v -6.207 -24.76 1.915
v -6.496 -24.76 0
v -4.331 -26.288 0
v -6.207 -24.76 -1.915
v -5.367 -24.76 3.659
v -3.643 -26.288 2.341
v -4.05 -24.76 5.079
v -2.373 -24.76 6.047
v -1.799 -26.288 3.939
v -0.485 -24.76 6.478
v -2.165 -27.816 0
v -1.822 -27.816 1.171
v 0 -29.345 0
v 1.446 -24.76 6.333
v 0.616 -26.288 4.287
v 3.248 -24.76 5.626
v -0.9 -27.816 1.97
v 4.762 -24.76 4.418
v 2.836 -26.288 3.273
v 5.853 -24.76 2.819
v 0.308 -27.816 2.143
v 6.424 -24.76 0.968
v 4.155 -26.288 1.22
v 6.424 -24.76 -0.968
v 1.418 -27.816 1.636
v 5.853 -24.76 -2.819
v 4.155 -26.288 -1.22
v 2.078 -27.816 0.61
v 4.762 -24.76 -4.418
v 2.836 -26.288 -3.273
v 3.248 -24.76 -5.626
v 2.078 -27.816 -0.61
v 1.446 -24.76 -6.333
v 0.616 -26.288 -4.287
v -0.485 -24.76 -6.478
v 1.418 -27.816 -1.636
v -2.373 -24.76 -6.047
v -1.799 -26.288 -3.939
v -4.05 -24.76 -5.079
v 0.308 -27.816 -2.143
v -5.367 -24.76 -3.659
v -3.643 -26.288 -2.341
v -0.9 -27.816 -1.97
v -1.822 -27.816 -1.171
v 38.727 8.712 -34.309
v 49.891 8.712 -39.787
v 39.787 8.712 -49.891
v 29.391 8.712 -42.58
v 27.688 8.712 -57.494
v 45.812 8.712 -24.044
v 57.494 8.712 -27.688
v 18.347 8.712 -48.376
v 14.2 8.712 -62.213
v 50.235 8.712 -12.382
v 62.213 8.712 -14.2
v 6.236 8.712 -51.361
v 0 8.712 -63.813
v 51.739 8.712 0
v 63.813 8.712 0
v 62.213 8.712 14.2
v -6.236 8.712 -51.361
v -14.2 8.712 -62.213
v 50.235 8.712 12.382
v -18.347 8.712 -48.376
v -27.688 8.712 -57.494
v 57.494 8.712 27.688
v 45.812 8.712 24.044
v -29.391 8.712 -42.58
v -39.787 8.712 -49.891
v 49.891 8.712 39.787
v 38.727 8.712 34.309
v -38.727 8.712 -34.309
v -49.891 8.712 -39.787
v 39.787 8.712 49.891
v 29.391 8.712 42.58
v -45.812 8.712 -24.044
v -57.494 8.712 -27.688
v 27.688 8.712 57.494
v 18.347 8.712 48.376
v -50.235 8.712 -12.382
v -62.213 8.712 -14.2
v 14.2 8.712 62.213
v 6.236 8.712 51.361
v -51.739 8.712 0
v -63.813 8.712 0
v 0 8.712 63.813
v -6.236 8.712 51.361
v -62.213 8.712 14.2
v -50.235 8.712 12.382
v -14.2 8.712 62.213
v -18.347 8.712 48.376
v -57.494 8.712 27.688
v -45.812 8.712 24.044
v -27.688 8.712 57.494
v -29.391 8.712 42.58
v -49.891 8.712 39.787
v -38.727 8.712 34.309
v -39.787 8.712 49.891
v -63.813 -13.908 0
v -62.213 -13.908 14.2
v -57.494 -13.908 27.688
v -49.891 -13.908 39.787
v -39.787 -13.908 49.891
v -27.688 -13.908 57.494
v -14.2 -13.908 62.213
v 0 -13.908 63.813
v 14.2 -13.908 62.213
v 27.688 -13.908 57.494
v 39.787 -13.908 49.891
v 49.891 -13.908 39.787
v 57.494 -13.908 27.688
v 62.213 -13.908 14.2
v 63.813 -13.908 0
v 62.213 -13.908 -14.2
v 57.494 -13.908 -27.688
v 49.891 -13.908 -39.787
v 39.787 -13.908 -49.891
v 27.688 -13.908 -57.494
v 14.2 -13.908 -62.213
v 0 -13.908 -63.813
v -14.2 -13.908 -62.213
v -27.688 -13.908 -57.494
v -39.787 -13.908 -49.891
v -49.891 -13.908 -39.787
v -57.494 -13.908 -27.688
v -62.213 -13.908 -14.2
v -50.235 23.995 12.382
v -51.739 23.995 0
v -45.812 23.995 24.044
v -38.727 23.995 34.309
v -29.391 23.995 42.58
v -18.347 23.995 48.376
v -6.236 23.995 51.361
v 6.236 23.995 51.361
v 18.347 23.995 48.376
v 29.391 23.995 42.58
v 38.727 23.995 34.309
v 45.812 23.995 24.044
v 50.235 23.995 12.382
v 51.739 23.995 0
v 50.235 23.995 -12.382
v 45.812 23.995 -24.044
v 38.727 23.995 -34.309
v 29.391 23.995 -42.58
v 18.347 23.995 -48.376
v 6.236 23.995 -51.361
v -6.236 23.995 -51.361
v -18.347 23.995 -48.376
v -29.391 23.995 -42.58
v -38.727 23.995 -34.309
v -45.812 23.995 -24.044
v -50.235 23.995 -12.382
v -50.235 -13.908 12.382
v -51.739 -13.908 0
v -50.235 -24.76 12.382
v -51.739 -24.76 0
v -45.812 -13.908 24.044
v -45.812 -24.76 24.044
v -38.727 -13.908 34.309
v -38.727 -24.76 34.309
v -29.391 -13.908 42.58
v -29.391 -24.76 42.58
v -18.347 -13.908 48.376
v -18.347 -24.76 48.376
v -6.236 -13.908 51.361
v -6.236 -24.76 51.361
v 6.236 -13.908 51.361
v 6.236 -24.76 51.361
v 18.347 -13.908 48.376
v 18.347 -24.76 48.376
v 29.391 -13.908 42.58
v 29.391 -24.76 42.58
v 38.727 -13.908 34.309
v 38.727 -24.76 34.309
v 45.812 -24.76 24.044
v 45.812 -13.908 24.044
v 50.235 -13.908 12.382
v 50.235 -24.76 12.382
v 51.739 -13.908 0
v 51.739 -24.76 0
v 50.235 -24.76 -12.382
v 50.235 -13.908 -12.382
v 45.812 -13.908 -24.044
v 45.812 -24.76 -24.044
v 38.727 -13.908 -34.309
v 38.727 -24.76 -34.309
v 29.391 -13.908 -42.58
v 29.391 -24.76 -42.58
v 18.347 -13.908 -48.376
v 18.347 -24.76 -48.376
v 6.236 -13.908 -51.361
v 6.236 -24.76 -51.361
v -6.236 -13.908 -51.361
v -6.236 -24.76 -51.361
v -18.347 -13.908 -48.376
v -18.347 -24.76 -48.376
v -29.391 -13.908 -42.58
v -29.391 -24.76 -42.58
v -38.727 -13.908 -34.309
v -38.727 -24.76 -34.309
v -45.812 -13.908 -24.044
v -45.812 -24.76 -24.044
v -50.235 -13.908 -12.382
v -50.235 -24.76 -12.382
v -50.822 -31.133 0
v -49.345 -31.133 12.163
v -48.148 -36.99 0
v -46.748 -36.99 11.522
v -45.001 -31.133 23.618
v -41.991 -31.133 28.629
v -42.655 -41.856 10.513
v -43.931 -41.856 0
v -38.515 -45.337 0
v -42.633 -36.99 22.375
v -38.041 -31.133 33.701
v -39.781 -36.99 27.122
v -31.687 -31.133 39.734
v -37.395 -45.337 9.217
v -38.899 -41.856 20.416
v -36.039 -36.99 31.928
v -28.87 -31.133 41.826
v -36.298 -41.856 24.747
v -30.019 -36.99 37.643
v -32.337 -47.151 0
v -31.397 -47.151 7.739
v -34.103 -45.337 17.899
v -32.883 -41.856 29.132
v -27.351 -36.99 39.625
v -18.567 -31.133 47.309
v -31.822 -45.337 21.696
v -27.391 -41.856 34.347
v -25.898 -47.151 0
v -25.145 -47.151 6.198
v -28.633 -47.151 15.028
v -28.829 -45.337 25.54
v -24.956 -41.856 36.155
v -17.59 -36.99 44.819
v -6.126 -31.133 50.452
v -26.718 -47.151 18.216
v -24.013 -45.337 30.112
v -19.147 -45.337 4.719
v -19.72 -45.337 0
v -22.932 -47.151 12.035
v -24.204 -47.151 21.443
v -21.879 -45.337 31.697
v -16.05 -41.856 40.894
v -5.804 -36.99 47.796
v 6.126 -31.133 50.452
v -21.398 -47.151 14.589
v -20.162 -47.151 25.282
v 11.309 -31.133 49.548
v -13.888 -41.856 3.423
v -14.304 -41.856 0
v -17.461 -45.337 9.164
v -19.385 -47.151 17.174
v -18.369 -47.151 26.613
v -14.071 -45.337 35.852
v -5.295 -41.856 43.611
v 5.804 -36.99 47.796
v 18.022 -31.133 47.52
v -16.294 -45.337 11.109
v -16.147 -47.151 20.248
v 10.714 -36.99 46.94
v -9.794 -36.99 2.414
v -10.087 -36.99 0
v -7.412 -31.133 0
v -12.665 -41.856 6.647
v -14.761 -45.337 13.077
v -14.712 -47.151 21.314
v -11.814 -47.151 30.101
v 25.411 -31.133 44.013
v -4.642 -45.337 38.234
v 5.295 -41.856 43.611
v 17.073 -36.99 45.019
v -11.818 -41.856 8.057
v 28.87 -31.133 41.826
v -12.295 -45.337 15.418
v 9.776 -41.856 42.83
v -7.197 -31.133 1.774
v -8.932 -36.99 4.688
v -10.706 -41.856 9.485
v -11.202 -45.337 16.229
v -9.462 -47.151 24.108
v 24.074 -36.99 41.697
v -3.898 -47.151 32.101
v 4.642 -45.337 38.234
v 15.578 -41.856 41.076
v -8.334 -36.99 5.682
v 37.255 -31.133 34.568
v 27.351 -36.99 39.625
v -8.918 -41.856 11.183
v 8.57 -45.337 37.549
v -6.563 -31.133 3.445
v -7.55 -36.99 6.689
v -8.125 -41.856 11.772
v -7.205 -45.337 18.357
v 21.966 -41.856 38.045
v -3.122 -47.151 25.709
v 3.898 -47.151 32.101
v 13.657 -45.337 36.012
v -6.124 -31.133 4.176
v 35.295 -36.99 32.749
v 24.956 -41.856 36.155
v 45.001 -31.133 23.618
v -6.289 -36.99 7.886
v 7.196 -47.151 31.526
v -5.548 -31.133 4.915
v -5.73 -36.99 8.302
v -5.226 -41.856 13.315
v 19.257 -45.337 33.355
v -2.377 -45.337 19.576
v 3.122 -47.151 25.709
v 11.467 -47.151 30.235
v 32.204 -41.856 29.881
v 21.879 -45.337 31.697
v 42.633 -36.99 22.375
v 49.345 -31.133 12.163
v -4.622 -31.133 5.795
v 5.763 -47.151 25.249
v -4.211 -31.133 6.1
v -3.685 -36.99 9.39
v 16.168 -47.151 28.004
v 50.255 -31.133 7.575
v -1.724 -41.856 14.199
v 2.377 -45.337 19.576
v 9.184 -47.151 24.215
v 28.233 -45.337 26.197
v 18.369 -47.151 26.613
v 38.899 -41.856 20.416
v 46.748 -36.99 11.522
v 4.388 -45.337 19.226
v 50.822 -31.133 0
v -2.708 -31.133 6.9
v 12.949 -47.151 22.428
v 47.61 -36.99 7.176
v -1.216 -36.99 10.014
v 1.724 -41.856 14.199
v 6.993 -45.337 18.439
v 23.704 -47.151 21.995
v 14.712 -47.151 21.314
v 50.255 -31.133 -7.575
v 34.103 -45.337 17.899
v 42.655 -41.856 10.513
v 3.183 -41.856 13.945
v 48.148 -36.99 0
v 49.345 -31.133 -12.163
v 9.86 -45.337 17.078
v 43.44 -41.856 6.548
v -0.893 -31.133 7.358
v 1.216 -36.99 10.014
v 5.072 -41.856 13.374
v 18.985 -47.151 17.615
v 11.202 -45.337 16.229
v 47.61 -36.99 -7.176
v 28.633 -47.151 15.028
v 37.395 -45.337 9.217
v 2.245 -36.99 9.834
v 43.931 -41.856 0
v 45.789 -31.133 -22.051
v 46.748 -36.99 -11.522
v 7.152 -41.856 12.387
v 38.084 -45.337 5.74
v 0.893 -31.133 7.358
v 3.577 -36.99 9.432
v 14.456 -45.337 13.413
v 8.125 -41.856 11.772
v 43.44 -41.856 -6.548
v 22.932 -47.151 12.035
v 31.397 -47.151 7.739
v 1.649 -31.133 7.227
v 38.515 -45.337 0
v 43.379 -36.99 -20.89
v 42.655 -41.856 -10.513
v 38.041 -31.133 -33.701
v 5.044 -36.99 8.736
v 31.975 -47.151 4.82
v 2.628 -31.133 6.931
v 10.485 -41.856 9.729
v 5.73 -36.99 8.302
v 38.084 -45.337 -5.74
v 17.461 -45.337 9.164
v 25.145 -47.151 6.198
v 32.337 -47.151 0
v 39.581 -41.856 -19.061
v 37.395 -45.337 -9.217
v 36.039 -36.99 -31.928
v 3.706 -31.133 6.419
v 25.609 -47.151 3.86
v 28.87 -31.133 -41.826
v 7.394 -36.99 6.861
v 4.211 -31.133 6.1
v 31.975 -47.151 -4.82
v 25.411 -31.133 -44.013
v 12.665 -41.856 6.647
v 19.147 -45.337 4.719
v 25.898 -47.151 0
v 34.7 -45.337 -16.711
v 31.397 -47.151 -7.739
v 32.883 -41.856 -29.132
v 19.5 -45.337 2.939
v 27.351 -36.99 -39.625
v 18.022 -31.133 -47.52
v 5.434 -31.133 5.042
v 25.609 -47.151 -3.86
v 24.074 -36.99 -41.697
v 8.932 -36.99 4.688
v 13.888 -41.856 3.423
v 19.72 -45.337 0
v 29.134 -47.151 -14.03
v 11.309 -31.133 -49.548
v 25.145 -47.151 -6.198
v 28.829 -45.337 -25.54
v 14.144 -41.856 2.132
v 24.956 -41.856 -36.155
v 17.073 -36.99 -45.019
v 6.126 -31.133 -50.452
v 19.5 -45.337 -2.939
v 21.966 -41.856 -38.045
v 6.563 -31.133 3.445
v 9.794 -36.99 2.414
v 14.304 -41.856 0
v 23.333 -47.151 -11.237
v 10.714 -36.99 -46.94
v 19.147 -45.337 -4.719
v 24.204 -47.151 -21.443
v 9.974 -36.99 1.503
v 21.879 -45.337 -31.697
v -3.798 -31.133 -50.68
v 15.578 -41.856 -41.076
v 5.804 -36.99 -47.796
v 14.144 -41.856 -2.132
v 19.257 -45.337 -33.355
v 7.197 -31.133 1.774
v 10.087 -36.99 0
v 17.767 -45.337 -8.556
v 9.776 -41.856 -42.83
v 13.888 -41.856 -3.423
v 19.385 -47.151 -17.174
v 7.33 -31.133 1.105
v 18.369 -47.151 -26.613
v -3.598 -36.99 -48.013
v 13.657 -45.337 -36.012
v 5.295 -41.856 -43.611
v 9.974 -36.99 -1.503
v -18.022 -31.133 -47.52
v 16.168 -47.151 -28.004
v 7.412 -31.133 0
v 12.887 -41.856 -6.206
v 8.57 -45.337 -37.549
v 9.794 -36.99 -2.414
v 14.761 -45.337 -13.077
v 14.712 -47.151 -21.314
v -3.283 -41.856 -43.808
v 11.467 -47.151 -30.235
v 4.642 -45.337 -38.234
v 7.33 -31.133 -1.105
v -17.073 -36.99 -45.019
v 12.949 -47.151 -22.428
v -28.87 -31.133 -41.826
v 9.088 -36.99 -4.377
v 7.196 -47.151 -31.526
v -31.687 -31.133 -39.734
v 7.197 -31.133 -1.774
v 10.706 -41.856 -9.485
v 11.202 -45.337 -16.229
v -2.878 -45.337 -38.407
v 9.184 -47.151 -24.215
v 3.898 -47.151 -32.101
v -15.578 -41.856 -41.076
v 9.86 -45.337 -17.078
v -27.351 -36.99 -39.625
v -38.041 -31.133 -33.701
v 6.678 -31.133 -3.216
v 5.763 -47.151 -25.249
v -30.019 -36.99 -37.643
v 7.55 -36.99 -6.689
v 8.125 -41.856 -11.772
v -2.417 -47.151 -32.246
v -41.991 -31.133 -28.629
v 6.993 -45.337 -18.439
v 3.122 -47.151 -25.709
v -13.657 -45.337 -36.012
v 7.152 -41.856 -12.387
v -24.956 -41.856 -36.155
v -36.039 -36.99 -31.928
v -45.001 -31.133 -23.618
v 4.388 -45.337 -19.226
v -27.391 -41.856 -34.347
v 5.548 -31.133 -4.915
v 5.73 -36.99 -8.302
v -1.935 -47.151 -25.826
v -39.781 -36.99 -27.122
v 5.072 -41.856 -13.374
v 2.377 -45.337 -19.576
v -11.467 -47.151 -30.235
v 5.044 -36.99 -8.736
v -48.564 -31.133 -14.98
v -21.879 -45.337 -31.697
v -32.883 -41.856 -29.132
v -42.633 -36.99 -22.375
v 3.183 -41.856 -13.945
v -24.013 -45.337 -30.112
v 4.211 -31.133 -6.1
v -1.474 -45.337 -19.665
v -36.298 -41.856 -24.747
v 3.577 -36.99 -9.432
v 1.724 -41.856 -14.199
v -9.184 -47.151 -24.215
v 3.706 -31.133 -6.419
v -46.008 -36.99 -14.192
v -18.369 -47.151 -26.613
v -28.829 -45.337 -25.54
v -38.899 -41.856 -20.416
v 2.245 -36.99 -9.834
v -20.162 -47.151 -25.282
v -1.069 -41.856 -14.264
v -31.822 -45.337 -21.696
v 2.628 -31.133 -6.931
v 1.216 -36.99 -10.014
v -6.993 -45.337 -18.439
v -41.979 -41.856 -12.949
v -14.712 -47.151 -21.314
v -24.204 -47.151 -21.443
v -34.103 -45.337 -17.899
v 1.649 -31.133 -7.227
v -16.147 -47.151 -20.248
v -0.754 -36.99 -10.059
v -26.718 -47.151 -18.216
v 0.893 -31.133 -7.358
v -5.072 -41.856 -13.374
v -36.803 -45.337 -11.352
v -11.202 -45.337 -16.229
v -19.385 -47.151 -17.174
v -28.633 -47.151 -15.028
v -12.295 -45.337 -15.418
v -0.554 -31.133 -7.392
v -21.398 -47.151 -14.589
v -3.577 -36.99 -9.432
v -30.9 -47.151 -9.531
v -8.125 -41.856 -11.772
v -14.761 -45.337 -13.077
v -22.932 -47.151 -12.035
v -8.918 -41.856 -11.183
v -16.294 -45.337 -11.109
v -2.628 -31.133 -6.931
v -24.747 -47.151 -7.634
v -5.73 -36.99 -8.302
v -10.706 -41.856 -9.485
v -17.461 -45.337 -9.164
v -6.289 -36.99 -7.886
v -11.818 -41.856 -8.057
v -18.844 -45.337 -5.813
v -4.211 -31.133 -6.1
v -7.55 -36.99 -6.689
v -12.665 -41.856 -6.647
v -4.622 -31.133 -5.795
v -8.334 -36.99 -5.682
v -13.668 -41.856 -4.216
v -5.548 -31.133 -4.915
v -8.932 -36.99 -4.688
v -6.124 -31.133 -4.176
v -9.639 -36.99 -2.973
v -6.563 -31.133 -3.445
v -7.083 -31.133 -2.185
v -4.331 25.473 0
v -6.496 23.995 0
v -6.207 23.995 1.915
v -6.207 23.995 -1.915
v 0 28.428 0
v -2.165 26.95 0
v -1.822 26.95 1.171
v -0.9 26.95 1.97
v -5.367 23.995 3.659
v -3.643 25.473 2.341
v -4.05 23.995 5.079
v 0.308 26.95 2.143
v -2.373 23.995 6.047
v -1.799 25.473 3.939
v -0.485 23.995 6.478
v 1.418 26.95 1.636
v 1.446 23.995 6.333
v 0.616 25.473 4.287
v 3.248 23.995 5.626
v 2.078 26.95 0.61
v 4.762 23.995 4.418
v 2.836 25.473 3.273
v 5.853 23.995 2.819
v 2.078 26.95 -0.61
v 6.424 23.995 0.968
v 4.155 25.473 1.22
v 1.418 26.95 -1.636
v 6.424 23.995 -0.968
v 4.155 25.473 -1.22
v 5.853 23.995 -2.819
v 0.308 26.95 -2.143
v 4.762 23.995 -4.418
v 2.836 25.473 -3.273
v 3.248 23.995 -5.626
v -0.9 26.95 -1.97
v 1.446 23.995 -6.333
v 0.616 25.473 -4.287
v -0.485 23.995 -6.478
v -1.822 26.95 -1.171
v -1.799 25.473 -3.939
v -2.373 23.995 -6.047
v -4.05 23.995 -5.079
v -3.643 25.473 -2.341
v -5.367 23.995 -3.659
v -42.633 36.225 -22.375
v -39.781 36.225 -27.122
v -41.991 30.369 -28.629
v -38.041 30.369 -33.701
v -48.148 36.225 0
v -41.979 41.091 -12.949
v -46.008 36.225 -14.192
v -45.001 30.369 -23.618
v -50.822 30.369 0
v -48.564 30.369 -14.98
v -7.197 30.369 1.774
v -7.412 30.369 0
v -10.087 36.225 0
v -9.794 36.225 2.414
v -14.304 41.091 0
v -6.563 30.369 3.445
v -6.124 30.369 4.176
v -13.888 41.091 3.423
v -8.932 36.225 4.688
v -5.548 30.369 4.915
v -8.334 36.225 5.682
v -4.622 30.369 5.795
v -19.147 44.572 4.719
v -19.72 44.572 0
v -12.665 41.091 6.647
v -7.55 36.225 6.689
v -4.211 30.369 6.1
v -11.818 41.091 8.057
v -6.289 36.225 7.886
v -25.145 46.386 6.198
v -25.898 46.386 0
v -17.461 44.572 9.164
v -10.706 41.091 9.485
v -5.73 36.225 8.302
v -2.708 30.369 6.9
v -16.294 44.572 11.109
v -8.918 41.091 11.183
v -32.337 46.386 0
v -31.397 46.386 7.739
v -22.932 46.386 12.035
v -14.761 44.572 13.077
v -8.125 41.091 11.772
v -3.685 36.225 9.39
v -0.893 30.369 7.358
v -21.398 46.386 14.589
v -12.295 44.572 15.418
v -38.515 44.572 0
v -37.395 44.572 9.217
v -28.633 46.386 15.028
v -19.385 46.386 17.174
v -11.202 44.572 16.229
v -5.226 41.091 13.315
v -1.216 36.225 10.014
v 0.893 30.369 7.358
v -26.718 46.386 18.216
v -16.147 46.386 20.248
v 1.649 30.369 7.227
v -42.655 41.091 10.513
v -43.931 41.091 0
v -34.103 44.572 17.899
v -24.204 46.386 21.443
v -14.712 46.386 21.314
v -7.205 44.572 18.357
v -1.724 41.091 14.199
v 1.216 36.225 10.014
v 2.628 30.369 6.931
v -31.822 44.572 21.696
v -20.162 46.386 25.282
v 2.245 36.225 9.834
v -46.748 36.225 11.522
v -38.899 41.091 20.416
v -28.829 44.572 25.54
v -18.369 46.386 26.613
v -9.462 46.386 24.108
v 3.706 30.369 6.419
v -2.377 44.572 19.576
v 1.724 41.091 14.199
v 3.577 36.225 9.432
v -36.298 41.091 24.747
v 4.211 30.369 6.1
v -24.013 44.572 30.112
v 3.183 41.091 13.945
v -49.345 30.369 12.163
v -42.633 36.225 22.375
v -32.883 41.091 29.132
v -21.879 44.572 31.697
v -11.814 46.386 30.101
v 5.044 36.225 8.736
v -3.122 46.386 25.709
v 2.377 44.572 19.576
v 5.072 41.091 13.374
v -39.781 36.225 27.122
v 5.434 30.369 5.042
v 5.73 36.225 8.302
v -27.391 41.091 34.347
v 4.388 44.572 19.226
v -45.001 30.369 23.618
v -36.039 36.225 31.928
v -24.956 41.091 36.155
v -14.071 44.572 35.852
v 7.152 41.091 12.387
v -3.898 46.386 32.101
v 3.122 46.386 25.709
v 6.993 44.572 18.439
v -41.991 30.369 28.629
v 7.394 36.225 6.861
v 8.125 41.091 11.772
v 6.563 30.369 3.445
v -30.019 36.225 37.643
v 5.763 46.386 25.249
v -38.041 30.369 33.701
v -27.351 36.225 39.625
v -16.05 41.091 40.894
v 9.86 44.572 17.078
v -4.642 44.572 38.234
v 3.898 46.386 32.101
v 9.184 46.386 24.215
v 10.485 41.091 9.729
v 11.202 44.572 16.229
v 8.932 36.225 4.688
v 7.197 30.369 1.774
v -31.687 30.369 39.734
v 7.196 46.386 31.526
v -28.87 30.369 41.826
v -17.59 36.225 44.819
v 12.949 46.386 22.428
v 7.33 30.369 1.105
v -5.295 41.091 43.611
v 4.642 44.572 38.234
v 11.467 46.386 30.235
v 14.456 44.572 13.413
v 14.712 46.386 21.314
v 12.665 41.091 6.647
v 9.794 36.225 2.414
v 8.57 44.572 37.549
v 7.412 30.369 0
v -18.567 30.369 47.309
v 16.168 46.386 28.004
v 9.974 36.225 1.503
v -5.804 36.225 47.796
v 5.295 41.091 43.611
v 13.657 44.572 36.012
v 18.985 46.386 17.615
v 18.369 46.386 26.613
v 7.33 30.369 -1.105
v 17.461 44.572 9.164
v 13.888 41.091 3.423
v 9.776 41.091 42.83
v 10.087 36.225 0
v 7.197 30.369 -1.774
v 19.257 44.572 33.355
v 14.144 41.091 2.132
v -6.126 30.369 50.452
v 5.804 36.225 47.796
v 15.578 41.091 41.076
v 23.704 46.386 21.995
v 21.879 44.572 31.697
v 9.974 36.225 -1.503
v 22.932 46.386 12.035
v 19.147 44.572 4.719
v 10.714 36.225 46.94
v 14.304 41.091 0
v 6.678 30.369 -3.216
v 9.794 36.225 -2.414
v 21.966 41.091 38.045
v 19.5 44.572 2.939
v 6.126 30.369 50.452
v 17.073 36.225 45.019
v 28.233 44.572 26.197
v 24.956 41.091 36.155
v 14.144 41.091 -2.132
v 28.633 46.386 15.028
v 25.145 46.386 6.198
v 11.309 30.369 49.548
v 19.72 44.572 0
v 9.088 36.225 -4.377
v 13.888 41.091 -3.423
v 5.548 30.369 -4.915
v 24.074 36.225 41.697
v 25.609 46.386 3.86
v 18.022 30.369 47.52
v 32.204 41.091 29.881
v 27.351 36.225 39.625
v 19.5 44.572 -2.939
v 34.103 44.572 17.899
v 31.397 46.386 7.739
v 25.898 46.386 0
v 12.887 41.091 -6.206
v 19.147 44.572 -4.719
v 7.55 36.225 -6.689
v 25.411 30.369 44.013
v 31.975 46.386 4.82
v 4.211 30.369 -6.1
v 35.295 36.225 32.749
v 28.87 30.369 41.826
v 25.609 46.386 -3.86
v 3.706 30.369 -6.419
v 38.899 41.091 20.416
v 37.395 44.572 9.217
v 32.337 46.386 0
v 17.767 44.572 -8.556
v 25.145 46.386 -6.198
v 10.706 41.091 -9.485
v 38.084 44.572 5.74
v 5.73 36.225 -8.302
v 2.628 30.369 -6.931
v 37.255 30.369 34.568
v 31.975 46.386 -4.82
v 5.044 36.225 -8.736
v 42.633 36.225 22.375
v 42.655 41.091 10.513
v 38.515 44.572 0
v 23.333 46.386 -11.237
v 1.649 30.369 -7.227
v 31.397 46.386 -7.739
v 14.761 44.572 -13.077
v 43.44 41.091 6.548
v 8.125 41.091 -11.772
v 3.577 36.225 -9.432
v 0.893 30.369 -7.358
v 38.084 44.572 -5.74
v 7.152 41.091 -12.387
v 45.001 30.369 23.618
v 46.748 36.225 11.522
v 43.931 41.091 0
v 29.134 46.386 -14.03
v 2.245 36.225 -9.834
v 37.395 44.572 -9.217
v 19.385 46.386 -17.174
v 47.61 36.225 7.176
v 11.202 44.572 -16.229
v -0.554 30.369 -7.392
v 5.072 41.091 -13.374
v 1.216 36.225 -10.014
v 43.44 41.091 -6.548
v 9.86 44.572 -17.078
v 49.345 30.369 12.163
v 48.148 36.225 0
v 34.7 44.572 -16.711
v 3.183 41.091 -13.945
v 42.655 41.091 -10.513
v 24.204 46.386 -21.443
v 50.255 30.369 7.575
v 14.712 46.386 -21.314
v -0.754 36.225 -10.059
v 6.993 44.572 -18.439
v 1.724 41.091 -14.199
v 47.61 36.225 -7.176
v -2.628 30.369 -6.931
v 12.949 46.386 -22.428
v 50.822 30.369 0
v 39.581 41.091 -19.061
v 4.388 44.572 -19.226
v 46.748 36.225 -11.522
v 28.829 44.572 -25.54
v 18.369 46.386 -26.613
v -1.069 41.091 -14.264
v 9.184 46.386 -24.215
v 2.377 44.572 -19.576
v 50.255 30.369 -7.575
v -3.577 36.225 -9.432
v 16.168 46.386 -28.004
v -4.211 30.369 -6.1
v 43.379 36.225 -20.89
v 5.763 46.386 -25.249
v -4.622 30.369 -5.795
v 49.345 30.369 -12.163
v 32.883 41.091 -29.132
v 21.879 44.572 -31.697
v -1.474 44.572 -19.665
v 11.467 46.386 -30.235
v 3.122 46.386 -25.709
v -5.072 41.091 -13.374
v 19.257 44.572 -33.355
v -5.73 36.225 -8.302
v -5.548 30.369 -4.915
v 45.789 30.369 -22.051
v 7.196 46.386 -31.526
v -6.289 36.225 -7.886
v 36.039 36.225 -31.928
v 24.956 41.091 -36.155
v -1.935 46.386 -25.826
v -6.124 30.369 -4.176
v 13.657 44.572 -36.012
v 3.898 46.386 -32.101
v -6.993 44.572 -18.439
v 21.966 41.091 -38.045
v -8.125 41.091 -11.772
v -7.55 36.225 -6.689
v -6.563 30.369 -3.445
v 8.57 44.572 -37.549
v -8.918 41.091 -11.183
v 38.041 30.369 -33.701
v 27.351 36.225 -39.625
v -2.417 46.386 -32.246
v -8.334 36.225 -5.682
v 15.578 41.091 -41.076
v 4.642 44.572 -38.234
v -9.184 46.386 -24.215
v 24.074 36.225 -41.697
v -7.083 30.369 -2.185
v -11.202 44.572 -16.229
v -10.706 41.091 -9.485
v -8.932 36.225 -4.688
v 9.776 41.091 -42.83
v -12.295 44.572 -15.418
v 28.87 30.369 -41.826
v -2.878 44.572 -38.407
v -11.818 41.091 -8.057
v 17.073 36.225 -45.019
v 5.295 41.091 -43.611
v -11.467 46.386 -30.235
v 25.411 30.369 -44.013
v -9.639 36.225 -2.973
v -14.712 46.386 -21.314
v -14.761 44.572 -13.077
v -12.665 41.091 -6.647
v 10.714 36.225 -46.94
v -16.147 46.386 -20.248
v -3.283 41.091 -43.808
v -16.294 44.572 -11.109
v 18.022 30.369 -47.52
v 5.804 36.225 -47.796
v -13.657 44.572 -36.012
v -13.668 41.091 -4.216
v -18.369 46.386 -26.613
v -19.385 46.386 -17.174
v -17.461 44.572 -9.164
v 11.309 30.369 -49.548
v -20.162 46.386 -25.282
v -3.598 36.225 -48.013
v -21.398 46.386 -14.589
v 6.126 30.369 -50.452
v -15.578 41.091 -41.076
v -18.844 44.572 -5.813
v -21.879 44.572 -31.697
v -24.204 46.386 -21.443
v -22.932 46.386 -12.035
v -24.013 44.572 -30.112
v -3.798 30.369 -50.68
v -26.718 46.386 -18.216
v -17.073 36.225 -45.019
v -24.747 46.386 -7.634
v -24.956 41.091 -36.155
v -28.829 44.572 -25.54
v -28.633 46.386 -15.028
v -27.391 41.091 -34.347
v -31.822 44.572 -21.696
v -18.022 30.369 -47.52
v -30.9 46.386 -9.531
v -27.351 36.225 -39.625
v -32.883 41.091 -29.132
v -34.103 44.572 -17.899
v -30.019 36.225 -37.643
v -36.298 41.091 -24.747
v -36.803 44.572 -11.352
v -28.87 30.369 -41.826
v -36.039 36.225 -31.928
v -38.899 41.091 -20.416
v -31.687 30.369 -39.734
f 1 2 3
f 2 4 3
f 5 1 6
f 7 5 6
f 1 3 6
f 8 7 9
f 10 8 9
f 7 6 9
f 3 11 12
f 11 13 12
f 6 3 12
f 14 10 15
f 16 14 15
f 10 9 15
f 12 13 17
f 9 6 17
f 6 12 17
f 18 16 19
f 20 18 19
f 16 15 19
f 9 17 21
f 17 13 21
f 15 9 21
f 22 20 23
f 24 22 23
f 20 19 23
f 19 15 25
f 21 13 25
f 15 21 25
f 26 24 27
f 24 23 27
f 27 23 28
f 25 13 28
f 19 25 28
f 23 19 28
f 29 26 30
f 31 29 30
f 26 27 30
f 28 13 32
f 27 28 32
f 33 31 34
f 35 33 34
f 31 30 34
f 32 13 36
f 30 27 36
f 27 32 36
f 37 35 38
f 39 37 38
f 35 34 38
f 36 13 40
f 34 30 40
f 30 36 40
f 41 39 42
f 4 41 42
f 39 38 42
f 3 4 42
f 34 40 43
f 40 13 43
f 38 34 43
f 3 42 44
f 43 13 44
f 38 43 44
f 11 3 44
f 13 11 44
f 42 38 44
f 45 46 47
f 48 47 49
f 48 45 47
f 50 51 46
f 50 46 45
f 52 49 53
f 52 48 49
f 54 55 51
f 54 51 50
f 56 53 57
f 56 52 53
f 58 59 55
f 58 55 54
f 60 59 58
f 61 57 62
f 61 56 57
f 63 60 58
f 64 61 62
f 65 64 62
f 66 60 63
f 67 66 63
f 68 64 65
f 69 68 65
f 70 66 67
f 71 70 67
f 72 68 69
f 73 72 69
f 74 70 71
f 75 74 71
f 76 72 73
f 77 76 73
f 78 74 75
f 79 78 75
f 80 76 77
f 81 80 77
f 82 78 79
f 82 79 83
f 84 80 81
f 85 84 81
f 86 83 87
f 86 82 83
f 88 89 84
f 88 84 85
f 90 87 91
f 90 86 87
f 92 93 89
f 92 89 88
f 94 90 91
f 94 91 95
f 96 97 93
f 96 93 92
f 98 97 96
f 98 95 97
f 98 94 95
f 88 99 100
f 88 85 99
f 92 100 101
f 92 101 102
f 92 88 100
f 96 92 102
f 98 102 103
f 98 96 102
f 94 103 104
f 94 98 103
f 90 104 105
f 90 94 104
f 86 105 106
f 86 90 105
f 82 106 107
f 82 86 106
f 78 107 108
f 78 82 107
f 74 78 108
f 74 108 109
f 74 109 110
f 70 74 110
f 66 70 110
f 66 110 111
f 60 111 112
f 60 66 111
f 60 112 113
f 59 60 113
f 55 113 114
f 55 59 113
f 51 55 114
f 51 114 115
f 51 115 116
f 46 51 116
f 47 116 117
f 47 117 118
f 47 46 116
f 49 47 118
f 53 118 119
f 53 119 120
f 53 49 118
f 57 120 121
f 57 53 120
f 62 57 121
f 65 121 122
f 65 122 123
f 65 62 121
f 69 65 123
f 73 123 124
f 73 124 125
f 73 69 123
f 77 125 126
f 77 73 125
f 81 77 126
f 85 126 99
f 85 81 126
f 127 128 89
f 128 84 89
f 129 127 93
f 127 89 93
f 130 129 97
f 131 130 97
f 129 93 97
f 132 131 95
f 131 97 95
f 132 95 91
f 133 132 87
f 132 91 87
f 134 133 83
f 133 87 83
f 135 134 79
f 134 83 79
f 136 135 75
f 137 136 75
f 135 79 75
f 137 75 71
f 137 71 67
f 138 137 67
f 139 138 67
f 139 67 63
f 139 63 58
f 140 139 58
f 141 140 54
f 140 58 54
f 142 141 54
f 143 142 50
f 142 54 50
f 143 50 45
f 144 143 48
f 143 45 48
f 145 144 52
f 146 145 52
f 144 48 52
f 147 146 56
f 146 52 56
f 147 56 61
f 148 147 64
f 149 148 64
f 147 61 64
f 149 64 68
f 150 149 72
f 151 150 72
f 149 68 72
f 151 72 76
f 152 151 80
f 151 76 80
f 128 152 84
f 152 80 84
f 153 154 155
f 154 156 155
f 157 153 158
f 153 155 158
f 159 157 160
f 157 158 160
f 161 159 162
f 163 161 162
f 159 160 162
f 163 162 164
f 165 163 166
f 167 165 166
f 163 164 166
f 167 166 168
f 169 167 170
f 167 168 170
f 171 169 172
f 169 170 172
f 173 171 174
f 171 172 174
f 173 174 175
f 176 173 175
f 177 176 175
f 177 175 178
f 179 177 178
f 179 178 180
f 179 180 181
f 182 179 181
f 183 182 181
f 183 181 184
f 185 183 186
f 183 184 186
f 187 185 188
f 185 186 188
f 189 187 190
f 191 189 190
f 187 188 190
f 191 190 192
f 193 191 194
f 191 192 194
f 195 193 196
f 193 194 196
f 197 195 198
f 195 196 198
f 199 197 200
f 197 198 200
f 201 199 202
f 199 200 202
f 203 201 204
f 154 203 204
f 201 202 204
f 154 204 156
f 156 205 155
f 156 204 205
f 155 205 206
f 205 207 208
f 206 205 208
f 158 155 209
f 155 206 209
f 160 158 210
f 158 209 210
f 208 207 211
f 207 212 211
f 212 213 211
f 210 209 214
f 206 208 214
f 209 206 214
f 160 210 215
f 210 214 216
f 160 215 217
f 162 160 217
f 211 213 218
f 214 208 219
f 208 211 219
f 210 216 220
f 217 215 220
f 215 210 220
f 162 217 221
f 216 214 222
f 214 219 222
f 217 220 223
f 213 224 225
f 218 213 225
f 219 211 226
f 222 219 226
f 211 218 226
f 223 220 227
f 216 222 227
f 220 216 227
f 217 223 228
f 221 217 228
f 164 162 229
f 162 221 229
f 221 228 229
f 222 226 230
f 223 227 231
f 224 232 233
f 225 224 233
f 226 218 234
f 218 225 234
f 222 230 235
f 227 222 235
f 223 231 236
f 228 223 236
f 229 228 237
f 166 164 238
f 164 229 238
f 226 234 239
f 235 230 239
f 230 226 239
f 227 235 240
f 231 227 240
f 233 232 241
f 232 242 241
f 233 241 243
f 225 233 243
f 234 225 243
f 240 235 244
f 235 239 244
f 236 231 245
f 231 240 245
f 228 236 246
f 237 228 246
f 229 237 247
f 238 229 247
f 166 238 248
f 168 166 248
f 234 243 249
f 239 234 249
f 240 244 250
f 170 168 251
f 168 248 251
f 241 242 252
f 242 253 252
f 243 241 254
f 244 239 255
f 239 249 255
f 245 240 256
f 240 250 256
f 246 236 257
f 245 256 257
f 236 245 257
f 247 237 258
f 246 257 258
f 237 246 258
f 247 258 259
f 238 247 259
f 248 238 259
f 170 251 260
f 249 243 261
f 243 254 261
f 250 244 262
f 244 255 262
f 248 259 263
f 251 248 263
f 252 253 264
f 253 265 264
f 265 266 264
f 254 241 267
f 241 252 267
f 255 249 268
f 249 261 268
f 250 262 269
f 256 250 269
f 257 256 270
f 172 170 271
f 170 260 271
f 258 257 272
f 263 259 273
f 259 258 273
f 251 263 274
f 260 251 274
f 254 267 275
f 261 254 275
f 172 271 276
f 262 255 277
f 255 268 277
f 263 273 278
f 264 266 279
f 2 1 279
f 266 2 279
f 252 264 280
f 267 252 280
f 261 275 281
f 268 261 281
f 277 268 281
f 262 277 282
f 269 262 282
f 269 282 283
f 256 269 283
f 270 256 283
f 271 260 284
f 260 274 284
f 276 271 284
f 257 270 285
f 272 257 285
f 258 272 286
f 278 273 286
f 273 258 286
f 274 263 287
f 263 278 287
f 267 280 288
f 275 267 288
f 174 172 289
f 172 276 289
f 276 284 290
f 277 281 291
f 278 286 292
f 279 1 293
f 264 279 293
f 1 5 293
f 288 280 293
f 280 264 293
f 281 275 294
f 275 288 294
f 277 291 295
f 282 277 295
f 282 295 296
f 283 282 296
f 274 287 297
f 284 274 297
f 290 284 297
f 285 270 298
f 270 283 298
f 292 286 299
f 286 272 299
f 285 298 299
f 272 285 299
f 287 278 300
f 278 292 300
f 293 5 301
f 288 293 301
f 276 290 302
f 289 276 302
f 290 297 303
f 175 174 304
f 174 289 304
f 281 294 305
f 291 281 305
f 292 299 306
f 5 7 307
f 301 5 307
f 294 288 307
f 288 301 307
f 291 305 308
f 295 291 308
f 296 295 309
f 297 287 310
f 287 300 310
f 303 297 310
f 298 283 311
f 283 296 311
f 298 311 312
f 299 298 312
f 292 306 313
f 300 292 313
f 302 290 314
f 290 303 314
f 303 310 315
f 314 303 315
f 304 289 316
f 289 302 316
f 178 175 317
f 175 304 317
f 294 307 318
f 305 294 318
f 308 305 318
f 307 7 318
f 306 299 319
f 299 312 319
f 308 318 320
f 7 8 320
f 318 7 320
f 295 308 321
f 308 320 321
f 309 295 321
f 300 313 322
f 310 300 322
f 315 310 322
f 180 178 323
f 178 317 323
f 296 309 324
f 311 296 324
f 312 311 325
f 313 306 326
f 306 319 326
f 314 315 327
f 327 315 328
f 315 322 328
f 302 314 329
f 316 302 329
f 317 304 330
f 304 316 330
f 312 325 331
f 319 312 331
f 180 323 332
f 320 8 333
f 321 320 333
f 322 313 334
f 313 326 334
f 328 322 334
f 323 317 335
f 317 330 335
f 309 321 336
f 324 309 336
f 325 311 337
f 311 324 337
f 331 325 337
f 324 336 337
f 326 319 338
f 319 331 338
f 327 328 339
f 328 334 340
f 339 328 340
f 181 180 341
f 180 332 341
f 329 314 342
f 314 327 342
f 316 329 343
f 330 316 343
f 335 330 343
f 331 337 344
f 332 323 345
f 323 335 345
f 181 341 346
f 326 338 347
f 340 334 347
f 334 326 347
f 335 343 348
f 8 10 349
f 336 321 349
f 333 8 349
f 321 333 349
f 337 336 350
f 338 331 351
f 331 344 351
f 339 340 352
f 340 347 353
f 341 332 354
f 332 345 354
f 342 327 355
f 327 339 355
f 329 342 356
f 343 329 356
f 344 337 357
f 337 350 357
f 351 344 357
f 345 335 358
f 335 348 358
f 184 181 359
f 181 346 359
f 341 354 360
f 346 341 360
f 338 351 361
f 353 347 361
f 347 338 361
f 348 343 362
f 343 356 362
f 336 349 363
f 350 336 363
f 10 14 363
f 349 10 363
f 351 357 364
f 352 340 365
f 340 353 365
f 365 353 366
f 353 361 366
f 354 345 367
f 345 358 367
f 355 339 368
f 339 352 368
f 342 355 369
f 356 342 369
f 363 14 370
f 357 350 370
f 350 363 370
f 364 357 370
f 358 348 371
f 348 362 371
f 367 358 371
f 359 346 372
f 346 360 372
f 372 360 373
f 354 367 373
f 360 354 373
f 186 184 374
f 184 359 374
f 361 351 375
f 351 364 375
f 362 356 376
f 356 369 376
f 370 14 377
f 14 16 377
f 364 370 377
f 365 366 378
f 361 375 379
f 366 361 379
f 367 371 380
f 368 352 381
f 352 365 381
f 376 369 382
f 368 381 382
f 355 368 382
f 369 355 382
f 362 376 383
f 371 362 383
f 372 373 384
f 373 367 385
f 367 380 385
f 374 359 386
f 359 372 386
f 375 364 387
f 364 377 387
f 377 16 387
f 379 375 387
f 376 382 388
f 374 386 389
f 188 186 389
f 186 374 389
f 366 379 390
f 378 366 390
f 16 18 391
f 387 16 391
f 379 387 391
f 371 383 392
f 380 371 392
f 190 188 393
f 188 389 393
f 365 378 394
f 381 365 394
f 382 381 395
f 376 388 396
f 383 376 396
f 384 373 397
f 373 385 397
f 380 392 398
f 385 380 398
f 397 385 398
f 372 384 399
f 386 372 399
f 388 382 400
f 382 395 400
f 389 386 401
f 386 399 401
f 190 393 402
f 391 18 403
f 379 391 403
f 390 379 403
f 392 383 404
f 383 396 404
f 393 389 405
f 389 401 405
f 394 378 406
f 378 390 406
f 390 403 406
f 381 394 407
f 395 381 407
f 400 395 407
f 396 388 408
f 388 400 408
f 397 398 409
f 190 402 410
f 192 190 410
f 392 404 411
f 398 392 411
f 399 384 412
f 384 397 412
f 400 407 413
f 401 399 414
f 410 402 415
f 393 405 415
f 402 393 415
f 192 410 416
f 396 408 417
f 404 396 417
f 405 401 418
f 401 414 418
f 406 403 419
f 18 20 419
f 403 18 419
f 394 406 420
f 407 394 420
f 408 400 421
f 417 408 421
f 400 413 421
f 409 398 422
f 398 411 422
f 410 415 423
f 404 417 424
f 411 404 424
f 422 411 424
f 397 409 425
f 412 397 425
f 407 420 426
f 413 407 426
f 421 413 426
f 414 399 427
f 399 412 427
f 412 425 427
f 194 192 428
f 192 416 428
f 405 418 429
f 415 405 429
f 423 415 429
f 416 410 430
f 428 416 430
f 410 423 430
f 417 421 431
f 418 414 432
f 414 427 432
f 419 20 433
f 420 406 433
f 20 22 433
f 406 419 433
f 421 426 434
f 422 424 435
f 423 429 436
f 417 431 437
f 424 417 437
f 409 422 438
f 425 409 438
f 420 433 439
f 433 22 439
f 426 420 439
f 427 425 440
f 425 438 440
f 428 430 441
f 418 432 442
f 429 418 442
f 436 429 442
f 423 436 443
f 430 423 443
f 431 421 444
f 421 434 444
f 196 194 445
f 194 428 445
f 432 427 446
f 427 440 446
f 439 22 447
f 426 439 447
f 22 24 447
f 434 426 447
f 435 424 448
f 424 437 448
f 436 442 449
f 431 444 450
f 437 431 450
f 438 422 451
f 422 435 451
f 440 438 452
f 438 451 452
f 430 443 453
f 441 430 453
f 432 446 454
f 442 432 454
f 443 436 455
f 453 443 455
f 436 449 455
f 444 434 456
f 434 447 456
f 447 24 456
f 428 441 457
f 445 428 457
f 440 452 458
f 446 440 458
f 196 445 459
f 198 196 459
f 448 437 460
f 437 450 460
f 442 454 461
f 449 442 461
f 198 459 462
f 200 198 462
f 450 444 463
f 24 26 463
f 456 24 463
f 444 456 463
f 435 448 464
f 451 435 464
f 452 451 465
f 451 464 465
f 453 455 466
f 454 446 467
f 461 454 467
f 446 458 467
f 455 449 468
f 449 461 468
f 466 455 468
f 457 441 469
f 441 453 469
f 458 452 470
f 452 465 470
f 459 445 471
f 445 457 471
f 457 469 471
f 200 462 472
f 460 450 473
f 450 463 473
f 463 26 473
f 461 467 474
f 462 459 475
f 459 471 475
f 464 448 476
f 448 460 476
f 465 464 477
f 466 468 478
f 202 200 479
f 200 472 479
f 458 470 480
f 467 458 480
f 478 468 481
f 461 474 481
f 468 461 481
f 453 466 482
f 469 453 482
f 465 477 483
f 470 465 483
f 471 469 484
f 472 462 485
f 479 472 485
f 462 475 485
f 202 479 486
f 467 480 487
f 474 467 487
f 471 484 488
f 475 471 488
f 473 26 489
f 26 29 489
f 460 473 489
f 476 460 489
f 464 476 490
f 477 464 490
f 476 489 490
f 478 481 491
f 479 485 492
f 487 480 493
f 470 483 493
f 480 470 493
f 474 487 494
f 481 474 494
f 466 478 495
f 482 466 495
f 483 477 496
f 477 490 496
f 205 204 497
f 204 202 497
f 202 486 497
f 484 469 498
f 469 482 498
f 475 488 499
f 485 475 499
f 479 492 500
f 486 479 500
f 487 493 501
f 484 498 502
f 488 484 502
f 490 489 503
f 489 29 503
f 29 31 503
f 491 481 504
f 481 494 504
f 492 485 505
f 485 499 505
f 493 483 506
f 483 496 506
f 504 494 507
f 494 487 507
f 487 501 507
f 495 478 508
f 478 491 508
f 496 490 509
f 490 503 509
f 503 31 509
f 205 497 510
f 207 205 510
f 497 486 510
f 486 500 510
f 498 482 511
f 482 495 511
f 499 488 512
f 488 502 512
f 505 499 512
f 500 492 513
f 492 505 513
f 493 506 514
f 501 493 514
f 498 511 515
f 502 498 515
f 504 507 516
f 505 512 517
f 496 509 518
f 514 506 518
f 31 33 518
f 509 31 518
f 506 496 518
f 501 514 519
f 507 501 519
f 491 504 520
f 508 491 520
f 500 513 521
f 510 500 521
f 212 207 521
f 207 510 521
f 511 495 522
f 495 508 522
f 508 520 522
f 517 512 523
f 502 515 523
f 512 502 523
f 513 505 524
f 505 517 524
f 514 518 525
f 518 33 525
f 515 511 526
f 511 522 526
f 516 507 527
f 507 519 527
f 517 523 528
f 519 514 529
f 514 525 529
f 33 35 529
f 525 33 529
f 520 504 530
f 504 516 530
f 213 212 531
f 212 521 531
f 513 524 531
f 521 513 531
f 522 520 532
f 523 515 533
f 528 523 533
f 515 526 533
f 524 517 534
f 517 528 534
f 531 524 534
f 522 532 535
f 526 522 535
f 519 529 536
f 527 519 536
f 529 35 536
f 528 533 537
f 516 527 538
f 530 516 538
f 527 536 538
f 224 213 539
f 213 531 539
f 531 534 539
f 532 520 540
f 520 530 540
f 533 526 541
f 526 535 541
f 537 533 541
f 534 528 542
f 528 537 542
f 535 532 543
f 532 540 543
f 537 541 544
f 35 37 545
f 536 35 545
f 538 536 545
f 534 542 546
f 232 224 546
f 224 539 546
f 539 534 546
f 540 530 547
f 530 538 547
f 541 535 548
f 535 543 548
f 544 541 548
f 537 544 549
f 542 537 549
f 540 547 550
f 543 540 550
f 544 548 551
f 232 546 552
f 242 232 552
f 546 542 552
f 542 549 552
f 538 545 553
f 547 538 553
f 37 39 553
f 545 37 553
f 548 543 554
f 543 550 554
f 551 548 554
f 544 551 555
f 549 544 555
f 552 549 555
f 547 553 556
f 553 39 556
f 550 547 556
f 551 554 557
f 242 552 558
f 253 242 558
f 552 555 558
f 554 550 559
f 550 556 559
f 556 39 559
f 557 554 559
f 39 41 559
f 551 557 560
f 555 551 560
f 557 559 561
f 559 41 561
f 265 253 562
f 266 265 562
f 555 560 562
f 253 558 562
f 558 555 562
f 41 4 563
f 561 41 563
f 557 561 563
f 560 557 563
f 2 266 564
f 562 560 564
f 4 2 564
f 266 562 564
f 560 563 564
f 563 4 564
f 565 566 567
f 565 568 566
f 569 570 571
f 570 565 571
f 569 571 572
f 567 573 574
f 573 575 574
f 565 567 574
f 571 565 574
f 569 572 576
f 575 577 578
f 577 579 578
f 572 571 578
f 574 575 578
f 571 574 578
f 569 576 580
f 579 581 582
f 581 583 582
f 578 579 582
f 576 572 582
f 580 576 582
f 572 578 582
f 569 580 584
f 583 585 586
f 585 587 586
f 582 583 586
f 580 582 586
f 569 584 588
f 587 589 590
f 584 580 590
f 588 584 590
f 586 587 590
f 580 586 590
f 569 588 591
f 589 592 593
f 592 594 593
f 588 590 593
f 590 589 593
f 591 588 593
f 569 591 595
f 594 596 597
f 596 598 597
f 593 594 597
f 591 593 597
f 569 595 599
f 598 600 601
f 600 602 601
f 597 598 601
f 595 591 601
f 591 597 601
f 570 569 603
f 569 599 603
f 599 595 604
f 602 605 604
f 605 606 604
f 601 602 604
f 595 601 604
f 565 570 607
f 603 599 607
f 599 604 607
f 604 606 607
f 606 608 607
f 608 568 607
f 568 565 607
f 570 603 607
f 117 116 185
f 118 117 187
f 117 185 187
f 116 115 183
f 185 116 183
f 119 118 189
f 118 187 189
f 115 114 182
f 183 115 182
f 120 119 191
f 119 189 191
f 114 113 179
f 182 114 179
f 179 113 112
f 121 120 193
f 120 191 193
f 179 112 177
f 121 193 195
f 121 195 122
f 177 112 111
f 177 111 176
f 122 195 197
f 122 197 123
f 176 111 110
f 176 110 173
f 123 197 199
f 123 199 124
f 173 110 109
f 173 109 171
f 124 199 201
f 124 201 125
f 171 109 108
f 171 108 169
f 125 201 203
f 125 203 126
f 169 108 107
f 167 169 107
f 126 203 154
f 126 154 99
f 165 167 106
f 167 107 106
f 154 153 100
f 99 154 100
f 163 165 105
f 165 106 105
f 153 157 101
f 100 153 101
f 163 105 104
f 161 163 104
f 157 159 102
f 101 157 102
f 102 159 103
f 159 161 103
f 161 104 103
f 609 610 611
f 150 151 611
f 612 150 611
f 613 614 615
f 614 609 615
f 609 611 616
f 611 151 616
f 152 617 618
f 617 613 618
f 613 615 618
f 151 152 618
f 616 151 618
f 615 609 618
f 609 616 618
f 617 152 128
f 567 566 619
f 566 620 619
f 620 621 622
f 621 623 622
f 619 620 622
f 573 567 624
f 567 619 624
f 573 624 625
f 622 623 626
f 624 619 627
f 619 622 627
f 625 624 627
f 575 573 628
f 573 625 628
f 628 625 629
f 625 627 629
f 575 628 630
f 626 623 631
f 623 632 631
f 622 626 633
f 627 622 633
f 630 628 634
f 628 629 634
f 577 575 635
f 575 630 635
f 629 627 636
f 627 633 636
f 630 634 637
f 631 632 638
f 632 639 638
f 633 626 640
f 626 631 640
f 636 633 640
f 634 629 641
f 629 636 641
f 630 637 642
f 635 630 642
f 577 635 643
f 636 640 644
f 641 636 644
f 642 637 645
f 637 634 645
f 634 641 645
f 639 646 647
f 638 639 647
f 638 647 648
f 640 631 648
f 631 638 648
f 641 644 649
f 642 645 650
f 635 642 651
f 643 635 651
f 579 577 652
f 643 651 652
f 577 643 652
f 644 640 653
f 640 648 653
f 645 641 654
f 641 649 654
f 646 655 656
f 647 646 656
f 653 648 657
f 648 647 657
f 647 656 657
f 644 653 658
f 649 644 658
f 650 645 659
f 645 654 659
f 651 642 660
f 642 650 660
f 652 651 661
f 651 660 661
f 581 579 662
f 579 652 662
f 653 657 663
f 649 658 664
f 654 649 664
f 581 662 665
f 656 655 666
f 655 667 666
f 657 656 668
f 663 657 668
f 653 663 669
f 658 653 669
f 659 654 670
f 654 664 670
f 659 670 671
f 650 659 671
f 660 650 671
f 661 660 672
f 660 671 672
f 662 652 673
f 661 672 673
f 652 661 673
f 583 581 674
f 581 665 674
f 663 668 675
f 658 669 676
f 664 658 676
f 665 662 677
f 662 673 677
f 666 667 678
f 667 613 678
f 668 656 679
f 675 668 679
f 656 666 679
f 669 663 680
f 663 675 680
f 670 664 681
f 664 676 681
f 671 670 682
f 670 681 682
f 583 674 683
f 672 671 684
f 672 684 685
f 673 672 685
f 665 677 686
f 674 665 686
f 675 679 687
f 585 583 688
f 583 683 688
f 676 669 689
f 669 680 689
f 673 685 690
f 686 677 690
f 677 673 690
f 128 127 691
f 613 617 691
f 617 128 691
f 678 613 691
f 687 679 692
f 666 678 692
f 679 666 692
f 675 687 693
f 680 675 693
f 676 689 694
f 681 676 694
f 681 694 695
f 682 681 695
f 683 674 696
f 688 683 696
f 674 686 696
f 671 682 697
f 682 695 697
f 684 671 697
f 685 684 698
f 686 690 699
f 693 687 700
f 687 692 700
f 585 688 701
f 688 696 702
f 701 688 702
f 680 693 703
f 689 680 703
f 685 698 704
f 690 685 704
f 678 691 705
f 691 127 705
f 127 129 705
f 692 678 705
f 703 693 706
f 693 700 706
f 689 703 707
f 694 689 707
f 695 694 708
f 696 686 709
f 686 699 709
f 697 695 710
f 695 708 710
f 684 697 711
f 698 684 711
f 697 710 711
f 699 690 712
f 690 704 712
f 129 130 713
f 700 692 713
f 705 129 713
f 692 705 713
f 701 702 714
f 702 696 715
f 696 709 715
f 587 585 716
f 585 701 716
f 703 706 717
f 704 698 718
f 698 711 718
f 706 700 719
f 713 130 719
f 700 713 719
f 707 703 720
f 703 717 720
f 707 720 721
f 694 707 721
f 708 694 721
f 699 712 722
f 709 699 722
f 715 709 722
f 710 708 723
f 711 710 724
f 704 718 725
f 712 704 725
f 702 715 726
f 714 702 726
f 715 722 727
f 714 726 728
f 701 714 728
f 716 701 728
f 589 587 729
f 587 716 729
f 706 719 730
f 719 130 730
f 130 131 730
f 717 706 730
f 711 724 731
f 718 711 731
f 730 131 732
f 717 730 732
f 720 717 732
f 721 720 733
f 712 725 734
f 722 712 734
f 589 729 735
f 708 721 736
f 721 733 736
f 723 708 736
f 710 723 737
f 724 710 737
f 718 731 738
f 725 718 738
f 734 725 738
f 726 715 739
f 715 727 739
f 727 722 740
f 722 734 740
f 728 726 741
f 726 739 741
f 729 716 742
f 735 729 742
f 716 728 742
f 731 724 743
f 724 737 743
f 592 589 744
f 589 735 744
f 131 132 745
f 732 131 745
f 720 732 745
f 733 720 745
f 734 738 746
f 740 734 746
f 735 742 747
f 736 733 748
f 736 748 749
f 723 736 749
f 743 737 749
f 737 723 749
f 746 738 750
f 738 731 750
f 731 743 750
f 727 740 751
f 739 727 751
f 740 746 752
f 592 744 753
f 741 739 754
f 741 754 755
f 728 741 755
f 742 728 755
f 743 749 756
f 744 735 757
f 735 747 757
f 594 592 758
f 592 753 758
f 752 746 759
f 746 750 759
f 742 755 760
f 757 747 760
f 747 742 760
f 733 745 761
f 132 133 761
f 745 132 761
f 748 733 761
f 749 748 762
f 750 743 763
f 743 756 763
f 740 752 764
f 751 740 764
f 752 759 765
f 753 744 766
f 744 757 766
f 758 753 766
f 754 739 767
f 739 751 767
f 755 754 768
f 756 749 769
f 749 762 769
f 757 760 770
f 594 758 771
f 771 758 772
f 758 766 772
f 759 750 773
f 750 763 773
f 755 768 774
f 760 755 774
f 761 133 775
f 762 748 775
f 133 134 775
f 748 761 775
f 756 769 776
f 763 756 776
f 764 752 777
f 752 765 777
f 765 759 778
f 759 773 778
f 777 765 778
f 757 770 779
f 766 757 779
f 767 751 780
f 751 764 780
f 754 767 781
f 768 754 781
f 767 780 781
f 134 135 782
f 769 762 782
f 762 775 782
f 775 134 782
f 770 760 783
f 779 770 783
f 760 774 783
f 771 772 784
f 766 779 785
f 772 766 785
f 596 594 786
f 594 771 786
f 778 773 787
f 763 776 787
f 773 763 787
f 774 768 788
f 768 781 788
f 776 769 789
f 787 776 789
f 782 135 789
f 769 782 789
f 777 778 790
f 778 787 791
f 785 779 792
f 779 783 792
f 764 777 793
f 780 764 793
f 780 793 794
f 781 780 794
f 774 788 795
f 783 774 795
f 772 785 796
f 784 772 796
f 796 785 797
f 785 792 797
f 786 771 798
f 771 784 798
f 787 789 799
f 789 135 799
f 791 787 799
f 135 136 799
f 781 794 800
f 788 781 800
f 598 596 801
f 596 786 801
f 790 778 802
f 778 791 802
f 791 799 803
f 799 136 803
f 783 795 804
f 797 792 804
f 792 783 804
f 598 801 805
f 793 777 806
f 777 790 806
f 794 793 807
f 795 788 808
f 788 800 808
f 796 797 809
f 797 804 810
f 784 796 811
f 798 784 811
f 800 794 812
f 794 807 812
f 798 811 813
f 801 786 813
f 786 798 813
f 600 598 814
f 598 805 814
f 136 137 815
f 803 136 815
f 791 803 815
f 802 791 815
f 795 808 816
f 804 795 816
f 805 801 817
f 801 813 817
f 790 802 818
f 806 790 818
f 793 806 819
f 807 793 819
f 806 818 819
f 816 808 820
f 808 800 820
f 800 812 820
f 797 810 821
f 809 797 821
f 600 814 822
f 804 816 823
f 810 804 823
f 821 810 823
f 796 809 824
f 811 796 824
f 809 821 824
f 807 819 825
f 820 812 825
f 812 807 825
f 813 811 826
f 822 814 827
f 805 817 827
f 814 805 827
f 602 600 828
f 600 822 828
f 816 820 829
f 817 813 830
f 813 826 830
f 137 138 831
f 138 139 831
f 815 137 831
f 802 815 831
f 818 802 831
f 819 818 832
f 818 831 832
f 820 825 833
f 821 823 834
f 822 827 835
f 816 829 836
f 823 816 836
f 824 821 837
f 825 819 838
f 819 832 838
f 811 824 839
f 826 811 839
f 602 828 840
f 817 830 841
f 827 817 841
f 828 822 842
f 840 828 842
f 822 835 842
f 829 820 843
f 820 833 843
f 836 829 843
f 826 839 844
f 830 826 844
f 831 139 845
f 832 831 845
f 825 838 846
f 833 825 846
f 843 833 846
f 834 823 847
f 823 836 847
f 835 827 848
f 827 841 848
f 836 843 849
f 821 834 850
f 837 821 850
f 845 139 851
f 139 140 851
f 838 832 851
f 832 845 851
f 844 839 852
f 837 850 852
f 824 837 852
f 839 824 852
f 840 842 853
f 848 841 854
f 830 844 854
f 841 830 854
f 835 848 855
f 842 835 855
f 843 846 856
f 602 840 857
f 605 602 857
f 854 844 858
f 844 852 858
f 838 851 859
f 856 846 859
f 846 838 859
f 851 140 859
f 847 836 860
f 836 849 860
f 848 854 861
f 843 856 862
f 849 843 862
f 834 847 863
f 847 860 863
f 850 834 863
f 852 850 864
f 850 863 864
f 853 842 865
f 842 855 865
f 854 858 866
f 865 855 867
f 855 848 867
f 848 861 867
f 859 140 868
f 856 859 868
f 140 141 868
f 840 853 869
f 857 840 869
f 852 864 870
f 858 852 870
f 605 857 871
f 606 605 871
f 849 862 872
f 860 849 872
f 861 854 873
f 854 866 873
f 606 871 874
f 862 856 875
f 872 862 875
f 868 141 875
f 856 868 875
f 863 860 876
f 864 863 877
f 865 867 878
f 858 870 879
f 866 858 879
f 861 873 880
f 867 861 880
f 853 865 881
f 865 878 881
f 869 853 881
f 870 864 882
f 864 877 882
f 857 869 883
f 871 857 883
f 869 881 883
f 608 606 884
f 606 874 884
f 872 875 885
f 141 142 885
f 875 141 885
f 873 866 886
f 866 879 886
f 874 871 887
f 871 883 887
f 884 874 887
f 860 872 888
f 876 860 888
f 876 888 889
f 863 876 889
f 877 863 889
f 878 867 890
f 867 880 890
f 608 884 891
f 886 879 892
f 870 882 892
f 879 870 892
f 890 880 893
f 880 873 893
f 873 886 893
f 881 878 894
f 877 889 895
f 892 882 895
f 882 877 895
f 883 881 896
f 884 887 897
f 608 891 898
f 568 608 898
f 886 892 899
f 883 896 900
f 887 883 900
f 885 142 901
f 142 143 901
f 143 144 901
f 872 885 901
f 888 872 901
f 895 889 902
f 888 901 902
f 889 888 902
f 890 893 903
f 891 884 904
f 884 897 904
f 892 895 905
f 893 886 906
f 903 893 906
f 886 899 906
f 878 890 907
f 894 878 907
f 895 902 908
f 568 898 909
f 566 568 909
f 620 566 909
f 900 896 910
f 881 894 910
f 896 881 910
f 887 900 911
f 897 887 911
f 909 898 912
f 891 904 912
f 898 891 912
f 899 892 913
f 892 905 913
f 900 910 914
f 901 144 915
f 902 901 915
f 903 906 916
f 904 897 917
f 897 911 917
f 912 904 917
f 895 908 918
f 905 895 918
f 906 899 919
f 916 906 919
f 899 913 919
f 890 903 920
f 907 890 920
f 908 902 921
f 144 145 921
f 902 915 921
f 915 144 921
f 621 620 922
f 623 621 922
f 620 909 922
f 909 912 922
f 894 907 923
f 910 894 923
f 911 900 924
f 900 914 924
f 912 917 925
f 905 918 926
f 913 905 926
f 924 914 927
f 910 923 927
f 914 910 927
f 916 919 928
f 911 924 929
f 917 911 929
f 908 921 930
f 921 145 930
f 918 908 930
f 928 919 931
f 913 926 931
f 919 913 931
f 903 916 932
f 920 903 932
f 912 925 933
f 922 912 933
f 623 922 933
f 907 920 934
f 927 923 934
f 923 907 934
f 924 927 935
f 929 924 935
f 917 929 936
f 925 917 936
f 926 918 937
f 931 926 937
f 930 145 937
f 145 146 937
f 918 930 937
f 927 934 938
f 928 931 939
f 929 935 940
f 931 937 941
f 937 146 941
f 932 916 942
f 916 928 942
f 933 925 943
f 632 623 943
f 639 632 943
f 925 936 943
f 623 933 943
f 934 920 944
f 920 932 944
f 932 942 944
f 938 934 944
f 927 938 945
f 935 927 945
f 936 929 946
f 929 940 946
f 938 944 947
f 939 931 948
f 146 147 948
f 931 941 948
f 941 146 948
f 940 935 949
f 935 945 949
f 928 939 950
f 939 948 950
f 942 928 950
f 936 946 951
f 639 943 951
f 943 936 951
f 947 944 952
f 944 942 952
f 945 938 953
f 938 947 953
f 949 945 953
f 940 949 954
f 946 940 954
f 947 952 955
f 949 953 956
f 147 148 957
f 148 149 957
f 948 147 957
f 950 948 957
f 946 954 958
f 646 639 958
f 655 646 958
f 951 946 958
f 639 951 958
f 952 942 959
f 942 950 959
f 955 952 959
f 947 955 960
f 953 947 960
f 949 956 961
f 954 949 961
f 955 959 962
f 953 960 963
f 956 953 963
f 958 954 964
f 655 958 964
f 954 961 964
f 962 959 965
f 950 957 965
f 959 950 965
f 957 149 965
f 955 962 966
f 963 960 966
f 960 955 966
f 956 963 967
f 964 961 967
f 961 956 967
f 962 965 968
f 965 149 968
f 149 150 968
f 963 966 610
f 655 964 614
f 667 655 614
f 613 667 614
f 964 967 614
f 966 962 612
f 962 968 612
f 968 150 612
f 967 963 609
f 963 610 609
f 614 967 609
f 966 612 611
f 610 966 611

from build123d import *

# Parameters (mm, degrees)
F0_W = 12.0748467743
F0_H = 22.6198285818


with BuildPart() as f1:
    # F0 (on Top) → F1 (revolve)
    with BuildSketch(Plane.XY):
        with BuildLine():
            ThreePointArc((-51.7385564744, -24.759542197), (-29.1173150763, -47.3807835951), (-6.4960736781, -24.759542197))
            Line((-6.4960736781, -24.759542197), (-51.7385564744, -24.759542197))
        make_face()
        with BuildLine():
            Line((-51.7385564744, 23.9953603595), (-6.4960736781, 23.9953603595))
            ThreePointArc((-6.4960736781, 23.9953603595), (-29.1173150763, 46.6166017577), (-51.7385564744, 23.9953603595))
        make_face()
        Polygon((-6.4960736781, 23.9953603595), (-6.4960736781, -24.759542197), (0, -29.3446425349), (0, 28.4276213497), align=None)
        with Locations((-57.7759798616, -2.5982232764)):
            Rectangle(F0_W, F0_H)
        Polygon((-51.7385564744, -24.759542197), (-6.4960736781, -24.759542197), (-6.4960736781, 23.9953603595), (-51.7385564744, 23.9953603595), (-51.7385564744, 8.7116910145), (-51.7385564744, -13.9081375673), align=None)
    revolve(axis=Axis((0, -0.4585105926, 0), (0, 1, 0)))


solid = f1.part
